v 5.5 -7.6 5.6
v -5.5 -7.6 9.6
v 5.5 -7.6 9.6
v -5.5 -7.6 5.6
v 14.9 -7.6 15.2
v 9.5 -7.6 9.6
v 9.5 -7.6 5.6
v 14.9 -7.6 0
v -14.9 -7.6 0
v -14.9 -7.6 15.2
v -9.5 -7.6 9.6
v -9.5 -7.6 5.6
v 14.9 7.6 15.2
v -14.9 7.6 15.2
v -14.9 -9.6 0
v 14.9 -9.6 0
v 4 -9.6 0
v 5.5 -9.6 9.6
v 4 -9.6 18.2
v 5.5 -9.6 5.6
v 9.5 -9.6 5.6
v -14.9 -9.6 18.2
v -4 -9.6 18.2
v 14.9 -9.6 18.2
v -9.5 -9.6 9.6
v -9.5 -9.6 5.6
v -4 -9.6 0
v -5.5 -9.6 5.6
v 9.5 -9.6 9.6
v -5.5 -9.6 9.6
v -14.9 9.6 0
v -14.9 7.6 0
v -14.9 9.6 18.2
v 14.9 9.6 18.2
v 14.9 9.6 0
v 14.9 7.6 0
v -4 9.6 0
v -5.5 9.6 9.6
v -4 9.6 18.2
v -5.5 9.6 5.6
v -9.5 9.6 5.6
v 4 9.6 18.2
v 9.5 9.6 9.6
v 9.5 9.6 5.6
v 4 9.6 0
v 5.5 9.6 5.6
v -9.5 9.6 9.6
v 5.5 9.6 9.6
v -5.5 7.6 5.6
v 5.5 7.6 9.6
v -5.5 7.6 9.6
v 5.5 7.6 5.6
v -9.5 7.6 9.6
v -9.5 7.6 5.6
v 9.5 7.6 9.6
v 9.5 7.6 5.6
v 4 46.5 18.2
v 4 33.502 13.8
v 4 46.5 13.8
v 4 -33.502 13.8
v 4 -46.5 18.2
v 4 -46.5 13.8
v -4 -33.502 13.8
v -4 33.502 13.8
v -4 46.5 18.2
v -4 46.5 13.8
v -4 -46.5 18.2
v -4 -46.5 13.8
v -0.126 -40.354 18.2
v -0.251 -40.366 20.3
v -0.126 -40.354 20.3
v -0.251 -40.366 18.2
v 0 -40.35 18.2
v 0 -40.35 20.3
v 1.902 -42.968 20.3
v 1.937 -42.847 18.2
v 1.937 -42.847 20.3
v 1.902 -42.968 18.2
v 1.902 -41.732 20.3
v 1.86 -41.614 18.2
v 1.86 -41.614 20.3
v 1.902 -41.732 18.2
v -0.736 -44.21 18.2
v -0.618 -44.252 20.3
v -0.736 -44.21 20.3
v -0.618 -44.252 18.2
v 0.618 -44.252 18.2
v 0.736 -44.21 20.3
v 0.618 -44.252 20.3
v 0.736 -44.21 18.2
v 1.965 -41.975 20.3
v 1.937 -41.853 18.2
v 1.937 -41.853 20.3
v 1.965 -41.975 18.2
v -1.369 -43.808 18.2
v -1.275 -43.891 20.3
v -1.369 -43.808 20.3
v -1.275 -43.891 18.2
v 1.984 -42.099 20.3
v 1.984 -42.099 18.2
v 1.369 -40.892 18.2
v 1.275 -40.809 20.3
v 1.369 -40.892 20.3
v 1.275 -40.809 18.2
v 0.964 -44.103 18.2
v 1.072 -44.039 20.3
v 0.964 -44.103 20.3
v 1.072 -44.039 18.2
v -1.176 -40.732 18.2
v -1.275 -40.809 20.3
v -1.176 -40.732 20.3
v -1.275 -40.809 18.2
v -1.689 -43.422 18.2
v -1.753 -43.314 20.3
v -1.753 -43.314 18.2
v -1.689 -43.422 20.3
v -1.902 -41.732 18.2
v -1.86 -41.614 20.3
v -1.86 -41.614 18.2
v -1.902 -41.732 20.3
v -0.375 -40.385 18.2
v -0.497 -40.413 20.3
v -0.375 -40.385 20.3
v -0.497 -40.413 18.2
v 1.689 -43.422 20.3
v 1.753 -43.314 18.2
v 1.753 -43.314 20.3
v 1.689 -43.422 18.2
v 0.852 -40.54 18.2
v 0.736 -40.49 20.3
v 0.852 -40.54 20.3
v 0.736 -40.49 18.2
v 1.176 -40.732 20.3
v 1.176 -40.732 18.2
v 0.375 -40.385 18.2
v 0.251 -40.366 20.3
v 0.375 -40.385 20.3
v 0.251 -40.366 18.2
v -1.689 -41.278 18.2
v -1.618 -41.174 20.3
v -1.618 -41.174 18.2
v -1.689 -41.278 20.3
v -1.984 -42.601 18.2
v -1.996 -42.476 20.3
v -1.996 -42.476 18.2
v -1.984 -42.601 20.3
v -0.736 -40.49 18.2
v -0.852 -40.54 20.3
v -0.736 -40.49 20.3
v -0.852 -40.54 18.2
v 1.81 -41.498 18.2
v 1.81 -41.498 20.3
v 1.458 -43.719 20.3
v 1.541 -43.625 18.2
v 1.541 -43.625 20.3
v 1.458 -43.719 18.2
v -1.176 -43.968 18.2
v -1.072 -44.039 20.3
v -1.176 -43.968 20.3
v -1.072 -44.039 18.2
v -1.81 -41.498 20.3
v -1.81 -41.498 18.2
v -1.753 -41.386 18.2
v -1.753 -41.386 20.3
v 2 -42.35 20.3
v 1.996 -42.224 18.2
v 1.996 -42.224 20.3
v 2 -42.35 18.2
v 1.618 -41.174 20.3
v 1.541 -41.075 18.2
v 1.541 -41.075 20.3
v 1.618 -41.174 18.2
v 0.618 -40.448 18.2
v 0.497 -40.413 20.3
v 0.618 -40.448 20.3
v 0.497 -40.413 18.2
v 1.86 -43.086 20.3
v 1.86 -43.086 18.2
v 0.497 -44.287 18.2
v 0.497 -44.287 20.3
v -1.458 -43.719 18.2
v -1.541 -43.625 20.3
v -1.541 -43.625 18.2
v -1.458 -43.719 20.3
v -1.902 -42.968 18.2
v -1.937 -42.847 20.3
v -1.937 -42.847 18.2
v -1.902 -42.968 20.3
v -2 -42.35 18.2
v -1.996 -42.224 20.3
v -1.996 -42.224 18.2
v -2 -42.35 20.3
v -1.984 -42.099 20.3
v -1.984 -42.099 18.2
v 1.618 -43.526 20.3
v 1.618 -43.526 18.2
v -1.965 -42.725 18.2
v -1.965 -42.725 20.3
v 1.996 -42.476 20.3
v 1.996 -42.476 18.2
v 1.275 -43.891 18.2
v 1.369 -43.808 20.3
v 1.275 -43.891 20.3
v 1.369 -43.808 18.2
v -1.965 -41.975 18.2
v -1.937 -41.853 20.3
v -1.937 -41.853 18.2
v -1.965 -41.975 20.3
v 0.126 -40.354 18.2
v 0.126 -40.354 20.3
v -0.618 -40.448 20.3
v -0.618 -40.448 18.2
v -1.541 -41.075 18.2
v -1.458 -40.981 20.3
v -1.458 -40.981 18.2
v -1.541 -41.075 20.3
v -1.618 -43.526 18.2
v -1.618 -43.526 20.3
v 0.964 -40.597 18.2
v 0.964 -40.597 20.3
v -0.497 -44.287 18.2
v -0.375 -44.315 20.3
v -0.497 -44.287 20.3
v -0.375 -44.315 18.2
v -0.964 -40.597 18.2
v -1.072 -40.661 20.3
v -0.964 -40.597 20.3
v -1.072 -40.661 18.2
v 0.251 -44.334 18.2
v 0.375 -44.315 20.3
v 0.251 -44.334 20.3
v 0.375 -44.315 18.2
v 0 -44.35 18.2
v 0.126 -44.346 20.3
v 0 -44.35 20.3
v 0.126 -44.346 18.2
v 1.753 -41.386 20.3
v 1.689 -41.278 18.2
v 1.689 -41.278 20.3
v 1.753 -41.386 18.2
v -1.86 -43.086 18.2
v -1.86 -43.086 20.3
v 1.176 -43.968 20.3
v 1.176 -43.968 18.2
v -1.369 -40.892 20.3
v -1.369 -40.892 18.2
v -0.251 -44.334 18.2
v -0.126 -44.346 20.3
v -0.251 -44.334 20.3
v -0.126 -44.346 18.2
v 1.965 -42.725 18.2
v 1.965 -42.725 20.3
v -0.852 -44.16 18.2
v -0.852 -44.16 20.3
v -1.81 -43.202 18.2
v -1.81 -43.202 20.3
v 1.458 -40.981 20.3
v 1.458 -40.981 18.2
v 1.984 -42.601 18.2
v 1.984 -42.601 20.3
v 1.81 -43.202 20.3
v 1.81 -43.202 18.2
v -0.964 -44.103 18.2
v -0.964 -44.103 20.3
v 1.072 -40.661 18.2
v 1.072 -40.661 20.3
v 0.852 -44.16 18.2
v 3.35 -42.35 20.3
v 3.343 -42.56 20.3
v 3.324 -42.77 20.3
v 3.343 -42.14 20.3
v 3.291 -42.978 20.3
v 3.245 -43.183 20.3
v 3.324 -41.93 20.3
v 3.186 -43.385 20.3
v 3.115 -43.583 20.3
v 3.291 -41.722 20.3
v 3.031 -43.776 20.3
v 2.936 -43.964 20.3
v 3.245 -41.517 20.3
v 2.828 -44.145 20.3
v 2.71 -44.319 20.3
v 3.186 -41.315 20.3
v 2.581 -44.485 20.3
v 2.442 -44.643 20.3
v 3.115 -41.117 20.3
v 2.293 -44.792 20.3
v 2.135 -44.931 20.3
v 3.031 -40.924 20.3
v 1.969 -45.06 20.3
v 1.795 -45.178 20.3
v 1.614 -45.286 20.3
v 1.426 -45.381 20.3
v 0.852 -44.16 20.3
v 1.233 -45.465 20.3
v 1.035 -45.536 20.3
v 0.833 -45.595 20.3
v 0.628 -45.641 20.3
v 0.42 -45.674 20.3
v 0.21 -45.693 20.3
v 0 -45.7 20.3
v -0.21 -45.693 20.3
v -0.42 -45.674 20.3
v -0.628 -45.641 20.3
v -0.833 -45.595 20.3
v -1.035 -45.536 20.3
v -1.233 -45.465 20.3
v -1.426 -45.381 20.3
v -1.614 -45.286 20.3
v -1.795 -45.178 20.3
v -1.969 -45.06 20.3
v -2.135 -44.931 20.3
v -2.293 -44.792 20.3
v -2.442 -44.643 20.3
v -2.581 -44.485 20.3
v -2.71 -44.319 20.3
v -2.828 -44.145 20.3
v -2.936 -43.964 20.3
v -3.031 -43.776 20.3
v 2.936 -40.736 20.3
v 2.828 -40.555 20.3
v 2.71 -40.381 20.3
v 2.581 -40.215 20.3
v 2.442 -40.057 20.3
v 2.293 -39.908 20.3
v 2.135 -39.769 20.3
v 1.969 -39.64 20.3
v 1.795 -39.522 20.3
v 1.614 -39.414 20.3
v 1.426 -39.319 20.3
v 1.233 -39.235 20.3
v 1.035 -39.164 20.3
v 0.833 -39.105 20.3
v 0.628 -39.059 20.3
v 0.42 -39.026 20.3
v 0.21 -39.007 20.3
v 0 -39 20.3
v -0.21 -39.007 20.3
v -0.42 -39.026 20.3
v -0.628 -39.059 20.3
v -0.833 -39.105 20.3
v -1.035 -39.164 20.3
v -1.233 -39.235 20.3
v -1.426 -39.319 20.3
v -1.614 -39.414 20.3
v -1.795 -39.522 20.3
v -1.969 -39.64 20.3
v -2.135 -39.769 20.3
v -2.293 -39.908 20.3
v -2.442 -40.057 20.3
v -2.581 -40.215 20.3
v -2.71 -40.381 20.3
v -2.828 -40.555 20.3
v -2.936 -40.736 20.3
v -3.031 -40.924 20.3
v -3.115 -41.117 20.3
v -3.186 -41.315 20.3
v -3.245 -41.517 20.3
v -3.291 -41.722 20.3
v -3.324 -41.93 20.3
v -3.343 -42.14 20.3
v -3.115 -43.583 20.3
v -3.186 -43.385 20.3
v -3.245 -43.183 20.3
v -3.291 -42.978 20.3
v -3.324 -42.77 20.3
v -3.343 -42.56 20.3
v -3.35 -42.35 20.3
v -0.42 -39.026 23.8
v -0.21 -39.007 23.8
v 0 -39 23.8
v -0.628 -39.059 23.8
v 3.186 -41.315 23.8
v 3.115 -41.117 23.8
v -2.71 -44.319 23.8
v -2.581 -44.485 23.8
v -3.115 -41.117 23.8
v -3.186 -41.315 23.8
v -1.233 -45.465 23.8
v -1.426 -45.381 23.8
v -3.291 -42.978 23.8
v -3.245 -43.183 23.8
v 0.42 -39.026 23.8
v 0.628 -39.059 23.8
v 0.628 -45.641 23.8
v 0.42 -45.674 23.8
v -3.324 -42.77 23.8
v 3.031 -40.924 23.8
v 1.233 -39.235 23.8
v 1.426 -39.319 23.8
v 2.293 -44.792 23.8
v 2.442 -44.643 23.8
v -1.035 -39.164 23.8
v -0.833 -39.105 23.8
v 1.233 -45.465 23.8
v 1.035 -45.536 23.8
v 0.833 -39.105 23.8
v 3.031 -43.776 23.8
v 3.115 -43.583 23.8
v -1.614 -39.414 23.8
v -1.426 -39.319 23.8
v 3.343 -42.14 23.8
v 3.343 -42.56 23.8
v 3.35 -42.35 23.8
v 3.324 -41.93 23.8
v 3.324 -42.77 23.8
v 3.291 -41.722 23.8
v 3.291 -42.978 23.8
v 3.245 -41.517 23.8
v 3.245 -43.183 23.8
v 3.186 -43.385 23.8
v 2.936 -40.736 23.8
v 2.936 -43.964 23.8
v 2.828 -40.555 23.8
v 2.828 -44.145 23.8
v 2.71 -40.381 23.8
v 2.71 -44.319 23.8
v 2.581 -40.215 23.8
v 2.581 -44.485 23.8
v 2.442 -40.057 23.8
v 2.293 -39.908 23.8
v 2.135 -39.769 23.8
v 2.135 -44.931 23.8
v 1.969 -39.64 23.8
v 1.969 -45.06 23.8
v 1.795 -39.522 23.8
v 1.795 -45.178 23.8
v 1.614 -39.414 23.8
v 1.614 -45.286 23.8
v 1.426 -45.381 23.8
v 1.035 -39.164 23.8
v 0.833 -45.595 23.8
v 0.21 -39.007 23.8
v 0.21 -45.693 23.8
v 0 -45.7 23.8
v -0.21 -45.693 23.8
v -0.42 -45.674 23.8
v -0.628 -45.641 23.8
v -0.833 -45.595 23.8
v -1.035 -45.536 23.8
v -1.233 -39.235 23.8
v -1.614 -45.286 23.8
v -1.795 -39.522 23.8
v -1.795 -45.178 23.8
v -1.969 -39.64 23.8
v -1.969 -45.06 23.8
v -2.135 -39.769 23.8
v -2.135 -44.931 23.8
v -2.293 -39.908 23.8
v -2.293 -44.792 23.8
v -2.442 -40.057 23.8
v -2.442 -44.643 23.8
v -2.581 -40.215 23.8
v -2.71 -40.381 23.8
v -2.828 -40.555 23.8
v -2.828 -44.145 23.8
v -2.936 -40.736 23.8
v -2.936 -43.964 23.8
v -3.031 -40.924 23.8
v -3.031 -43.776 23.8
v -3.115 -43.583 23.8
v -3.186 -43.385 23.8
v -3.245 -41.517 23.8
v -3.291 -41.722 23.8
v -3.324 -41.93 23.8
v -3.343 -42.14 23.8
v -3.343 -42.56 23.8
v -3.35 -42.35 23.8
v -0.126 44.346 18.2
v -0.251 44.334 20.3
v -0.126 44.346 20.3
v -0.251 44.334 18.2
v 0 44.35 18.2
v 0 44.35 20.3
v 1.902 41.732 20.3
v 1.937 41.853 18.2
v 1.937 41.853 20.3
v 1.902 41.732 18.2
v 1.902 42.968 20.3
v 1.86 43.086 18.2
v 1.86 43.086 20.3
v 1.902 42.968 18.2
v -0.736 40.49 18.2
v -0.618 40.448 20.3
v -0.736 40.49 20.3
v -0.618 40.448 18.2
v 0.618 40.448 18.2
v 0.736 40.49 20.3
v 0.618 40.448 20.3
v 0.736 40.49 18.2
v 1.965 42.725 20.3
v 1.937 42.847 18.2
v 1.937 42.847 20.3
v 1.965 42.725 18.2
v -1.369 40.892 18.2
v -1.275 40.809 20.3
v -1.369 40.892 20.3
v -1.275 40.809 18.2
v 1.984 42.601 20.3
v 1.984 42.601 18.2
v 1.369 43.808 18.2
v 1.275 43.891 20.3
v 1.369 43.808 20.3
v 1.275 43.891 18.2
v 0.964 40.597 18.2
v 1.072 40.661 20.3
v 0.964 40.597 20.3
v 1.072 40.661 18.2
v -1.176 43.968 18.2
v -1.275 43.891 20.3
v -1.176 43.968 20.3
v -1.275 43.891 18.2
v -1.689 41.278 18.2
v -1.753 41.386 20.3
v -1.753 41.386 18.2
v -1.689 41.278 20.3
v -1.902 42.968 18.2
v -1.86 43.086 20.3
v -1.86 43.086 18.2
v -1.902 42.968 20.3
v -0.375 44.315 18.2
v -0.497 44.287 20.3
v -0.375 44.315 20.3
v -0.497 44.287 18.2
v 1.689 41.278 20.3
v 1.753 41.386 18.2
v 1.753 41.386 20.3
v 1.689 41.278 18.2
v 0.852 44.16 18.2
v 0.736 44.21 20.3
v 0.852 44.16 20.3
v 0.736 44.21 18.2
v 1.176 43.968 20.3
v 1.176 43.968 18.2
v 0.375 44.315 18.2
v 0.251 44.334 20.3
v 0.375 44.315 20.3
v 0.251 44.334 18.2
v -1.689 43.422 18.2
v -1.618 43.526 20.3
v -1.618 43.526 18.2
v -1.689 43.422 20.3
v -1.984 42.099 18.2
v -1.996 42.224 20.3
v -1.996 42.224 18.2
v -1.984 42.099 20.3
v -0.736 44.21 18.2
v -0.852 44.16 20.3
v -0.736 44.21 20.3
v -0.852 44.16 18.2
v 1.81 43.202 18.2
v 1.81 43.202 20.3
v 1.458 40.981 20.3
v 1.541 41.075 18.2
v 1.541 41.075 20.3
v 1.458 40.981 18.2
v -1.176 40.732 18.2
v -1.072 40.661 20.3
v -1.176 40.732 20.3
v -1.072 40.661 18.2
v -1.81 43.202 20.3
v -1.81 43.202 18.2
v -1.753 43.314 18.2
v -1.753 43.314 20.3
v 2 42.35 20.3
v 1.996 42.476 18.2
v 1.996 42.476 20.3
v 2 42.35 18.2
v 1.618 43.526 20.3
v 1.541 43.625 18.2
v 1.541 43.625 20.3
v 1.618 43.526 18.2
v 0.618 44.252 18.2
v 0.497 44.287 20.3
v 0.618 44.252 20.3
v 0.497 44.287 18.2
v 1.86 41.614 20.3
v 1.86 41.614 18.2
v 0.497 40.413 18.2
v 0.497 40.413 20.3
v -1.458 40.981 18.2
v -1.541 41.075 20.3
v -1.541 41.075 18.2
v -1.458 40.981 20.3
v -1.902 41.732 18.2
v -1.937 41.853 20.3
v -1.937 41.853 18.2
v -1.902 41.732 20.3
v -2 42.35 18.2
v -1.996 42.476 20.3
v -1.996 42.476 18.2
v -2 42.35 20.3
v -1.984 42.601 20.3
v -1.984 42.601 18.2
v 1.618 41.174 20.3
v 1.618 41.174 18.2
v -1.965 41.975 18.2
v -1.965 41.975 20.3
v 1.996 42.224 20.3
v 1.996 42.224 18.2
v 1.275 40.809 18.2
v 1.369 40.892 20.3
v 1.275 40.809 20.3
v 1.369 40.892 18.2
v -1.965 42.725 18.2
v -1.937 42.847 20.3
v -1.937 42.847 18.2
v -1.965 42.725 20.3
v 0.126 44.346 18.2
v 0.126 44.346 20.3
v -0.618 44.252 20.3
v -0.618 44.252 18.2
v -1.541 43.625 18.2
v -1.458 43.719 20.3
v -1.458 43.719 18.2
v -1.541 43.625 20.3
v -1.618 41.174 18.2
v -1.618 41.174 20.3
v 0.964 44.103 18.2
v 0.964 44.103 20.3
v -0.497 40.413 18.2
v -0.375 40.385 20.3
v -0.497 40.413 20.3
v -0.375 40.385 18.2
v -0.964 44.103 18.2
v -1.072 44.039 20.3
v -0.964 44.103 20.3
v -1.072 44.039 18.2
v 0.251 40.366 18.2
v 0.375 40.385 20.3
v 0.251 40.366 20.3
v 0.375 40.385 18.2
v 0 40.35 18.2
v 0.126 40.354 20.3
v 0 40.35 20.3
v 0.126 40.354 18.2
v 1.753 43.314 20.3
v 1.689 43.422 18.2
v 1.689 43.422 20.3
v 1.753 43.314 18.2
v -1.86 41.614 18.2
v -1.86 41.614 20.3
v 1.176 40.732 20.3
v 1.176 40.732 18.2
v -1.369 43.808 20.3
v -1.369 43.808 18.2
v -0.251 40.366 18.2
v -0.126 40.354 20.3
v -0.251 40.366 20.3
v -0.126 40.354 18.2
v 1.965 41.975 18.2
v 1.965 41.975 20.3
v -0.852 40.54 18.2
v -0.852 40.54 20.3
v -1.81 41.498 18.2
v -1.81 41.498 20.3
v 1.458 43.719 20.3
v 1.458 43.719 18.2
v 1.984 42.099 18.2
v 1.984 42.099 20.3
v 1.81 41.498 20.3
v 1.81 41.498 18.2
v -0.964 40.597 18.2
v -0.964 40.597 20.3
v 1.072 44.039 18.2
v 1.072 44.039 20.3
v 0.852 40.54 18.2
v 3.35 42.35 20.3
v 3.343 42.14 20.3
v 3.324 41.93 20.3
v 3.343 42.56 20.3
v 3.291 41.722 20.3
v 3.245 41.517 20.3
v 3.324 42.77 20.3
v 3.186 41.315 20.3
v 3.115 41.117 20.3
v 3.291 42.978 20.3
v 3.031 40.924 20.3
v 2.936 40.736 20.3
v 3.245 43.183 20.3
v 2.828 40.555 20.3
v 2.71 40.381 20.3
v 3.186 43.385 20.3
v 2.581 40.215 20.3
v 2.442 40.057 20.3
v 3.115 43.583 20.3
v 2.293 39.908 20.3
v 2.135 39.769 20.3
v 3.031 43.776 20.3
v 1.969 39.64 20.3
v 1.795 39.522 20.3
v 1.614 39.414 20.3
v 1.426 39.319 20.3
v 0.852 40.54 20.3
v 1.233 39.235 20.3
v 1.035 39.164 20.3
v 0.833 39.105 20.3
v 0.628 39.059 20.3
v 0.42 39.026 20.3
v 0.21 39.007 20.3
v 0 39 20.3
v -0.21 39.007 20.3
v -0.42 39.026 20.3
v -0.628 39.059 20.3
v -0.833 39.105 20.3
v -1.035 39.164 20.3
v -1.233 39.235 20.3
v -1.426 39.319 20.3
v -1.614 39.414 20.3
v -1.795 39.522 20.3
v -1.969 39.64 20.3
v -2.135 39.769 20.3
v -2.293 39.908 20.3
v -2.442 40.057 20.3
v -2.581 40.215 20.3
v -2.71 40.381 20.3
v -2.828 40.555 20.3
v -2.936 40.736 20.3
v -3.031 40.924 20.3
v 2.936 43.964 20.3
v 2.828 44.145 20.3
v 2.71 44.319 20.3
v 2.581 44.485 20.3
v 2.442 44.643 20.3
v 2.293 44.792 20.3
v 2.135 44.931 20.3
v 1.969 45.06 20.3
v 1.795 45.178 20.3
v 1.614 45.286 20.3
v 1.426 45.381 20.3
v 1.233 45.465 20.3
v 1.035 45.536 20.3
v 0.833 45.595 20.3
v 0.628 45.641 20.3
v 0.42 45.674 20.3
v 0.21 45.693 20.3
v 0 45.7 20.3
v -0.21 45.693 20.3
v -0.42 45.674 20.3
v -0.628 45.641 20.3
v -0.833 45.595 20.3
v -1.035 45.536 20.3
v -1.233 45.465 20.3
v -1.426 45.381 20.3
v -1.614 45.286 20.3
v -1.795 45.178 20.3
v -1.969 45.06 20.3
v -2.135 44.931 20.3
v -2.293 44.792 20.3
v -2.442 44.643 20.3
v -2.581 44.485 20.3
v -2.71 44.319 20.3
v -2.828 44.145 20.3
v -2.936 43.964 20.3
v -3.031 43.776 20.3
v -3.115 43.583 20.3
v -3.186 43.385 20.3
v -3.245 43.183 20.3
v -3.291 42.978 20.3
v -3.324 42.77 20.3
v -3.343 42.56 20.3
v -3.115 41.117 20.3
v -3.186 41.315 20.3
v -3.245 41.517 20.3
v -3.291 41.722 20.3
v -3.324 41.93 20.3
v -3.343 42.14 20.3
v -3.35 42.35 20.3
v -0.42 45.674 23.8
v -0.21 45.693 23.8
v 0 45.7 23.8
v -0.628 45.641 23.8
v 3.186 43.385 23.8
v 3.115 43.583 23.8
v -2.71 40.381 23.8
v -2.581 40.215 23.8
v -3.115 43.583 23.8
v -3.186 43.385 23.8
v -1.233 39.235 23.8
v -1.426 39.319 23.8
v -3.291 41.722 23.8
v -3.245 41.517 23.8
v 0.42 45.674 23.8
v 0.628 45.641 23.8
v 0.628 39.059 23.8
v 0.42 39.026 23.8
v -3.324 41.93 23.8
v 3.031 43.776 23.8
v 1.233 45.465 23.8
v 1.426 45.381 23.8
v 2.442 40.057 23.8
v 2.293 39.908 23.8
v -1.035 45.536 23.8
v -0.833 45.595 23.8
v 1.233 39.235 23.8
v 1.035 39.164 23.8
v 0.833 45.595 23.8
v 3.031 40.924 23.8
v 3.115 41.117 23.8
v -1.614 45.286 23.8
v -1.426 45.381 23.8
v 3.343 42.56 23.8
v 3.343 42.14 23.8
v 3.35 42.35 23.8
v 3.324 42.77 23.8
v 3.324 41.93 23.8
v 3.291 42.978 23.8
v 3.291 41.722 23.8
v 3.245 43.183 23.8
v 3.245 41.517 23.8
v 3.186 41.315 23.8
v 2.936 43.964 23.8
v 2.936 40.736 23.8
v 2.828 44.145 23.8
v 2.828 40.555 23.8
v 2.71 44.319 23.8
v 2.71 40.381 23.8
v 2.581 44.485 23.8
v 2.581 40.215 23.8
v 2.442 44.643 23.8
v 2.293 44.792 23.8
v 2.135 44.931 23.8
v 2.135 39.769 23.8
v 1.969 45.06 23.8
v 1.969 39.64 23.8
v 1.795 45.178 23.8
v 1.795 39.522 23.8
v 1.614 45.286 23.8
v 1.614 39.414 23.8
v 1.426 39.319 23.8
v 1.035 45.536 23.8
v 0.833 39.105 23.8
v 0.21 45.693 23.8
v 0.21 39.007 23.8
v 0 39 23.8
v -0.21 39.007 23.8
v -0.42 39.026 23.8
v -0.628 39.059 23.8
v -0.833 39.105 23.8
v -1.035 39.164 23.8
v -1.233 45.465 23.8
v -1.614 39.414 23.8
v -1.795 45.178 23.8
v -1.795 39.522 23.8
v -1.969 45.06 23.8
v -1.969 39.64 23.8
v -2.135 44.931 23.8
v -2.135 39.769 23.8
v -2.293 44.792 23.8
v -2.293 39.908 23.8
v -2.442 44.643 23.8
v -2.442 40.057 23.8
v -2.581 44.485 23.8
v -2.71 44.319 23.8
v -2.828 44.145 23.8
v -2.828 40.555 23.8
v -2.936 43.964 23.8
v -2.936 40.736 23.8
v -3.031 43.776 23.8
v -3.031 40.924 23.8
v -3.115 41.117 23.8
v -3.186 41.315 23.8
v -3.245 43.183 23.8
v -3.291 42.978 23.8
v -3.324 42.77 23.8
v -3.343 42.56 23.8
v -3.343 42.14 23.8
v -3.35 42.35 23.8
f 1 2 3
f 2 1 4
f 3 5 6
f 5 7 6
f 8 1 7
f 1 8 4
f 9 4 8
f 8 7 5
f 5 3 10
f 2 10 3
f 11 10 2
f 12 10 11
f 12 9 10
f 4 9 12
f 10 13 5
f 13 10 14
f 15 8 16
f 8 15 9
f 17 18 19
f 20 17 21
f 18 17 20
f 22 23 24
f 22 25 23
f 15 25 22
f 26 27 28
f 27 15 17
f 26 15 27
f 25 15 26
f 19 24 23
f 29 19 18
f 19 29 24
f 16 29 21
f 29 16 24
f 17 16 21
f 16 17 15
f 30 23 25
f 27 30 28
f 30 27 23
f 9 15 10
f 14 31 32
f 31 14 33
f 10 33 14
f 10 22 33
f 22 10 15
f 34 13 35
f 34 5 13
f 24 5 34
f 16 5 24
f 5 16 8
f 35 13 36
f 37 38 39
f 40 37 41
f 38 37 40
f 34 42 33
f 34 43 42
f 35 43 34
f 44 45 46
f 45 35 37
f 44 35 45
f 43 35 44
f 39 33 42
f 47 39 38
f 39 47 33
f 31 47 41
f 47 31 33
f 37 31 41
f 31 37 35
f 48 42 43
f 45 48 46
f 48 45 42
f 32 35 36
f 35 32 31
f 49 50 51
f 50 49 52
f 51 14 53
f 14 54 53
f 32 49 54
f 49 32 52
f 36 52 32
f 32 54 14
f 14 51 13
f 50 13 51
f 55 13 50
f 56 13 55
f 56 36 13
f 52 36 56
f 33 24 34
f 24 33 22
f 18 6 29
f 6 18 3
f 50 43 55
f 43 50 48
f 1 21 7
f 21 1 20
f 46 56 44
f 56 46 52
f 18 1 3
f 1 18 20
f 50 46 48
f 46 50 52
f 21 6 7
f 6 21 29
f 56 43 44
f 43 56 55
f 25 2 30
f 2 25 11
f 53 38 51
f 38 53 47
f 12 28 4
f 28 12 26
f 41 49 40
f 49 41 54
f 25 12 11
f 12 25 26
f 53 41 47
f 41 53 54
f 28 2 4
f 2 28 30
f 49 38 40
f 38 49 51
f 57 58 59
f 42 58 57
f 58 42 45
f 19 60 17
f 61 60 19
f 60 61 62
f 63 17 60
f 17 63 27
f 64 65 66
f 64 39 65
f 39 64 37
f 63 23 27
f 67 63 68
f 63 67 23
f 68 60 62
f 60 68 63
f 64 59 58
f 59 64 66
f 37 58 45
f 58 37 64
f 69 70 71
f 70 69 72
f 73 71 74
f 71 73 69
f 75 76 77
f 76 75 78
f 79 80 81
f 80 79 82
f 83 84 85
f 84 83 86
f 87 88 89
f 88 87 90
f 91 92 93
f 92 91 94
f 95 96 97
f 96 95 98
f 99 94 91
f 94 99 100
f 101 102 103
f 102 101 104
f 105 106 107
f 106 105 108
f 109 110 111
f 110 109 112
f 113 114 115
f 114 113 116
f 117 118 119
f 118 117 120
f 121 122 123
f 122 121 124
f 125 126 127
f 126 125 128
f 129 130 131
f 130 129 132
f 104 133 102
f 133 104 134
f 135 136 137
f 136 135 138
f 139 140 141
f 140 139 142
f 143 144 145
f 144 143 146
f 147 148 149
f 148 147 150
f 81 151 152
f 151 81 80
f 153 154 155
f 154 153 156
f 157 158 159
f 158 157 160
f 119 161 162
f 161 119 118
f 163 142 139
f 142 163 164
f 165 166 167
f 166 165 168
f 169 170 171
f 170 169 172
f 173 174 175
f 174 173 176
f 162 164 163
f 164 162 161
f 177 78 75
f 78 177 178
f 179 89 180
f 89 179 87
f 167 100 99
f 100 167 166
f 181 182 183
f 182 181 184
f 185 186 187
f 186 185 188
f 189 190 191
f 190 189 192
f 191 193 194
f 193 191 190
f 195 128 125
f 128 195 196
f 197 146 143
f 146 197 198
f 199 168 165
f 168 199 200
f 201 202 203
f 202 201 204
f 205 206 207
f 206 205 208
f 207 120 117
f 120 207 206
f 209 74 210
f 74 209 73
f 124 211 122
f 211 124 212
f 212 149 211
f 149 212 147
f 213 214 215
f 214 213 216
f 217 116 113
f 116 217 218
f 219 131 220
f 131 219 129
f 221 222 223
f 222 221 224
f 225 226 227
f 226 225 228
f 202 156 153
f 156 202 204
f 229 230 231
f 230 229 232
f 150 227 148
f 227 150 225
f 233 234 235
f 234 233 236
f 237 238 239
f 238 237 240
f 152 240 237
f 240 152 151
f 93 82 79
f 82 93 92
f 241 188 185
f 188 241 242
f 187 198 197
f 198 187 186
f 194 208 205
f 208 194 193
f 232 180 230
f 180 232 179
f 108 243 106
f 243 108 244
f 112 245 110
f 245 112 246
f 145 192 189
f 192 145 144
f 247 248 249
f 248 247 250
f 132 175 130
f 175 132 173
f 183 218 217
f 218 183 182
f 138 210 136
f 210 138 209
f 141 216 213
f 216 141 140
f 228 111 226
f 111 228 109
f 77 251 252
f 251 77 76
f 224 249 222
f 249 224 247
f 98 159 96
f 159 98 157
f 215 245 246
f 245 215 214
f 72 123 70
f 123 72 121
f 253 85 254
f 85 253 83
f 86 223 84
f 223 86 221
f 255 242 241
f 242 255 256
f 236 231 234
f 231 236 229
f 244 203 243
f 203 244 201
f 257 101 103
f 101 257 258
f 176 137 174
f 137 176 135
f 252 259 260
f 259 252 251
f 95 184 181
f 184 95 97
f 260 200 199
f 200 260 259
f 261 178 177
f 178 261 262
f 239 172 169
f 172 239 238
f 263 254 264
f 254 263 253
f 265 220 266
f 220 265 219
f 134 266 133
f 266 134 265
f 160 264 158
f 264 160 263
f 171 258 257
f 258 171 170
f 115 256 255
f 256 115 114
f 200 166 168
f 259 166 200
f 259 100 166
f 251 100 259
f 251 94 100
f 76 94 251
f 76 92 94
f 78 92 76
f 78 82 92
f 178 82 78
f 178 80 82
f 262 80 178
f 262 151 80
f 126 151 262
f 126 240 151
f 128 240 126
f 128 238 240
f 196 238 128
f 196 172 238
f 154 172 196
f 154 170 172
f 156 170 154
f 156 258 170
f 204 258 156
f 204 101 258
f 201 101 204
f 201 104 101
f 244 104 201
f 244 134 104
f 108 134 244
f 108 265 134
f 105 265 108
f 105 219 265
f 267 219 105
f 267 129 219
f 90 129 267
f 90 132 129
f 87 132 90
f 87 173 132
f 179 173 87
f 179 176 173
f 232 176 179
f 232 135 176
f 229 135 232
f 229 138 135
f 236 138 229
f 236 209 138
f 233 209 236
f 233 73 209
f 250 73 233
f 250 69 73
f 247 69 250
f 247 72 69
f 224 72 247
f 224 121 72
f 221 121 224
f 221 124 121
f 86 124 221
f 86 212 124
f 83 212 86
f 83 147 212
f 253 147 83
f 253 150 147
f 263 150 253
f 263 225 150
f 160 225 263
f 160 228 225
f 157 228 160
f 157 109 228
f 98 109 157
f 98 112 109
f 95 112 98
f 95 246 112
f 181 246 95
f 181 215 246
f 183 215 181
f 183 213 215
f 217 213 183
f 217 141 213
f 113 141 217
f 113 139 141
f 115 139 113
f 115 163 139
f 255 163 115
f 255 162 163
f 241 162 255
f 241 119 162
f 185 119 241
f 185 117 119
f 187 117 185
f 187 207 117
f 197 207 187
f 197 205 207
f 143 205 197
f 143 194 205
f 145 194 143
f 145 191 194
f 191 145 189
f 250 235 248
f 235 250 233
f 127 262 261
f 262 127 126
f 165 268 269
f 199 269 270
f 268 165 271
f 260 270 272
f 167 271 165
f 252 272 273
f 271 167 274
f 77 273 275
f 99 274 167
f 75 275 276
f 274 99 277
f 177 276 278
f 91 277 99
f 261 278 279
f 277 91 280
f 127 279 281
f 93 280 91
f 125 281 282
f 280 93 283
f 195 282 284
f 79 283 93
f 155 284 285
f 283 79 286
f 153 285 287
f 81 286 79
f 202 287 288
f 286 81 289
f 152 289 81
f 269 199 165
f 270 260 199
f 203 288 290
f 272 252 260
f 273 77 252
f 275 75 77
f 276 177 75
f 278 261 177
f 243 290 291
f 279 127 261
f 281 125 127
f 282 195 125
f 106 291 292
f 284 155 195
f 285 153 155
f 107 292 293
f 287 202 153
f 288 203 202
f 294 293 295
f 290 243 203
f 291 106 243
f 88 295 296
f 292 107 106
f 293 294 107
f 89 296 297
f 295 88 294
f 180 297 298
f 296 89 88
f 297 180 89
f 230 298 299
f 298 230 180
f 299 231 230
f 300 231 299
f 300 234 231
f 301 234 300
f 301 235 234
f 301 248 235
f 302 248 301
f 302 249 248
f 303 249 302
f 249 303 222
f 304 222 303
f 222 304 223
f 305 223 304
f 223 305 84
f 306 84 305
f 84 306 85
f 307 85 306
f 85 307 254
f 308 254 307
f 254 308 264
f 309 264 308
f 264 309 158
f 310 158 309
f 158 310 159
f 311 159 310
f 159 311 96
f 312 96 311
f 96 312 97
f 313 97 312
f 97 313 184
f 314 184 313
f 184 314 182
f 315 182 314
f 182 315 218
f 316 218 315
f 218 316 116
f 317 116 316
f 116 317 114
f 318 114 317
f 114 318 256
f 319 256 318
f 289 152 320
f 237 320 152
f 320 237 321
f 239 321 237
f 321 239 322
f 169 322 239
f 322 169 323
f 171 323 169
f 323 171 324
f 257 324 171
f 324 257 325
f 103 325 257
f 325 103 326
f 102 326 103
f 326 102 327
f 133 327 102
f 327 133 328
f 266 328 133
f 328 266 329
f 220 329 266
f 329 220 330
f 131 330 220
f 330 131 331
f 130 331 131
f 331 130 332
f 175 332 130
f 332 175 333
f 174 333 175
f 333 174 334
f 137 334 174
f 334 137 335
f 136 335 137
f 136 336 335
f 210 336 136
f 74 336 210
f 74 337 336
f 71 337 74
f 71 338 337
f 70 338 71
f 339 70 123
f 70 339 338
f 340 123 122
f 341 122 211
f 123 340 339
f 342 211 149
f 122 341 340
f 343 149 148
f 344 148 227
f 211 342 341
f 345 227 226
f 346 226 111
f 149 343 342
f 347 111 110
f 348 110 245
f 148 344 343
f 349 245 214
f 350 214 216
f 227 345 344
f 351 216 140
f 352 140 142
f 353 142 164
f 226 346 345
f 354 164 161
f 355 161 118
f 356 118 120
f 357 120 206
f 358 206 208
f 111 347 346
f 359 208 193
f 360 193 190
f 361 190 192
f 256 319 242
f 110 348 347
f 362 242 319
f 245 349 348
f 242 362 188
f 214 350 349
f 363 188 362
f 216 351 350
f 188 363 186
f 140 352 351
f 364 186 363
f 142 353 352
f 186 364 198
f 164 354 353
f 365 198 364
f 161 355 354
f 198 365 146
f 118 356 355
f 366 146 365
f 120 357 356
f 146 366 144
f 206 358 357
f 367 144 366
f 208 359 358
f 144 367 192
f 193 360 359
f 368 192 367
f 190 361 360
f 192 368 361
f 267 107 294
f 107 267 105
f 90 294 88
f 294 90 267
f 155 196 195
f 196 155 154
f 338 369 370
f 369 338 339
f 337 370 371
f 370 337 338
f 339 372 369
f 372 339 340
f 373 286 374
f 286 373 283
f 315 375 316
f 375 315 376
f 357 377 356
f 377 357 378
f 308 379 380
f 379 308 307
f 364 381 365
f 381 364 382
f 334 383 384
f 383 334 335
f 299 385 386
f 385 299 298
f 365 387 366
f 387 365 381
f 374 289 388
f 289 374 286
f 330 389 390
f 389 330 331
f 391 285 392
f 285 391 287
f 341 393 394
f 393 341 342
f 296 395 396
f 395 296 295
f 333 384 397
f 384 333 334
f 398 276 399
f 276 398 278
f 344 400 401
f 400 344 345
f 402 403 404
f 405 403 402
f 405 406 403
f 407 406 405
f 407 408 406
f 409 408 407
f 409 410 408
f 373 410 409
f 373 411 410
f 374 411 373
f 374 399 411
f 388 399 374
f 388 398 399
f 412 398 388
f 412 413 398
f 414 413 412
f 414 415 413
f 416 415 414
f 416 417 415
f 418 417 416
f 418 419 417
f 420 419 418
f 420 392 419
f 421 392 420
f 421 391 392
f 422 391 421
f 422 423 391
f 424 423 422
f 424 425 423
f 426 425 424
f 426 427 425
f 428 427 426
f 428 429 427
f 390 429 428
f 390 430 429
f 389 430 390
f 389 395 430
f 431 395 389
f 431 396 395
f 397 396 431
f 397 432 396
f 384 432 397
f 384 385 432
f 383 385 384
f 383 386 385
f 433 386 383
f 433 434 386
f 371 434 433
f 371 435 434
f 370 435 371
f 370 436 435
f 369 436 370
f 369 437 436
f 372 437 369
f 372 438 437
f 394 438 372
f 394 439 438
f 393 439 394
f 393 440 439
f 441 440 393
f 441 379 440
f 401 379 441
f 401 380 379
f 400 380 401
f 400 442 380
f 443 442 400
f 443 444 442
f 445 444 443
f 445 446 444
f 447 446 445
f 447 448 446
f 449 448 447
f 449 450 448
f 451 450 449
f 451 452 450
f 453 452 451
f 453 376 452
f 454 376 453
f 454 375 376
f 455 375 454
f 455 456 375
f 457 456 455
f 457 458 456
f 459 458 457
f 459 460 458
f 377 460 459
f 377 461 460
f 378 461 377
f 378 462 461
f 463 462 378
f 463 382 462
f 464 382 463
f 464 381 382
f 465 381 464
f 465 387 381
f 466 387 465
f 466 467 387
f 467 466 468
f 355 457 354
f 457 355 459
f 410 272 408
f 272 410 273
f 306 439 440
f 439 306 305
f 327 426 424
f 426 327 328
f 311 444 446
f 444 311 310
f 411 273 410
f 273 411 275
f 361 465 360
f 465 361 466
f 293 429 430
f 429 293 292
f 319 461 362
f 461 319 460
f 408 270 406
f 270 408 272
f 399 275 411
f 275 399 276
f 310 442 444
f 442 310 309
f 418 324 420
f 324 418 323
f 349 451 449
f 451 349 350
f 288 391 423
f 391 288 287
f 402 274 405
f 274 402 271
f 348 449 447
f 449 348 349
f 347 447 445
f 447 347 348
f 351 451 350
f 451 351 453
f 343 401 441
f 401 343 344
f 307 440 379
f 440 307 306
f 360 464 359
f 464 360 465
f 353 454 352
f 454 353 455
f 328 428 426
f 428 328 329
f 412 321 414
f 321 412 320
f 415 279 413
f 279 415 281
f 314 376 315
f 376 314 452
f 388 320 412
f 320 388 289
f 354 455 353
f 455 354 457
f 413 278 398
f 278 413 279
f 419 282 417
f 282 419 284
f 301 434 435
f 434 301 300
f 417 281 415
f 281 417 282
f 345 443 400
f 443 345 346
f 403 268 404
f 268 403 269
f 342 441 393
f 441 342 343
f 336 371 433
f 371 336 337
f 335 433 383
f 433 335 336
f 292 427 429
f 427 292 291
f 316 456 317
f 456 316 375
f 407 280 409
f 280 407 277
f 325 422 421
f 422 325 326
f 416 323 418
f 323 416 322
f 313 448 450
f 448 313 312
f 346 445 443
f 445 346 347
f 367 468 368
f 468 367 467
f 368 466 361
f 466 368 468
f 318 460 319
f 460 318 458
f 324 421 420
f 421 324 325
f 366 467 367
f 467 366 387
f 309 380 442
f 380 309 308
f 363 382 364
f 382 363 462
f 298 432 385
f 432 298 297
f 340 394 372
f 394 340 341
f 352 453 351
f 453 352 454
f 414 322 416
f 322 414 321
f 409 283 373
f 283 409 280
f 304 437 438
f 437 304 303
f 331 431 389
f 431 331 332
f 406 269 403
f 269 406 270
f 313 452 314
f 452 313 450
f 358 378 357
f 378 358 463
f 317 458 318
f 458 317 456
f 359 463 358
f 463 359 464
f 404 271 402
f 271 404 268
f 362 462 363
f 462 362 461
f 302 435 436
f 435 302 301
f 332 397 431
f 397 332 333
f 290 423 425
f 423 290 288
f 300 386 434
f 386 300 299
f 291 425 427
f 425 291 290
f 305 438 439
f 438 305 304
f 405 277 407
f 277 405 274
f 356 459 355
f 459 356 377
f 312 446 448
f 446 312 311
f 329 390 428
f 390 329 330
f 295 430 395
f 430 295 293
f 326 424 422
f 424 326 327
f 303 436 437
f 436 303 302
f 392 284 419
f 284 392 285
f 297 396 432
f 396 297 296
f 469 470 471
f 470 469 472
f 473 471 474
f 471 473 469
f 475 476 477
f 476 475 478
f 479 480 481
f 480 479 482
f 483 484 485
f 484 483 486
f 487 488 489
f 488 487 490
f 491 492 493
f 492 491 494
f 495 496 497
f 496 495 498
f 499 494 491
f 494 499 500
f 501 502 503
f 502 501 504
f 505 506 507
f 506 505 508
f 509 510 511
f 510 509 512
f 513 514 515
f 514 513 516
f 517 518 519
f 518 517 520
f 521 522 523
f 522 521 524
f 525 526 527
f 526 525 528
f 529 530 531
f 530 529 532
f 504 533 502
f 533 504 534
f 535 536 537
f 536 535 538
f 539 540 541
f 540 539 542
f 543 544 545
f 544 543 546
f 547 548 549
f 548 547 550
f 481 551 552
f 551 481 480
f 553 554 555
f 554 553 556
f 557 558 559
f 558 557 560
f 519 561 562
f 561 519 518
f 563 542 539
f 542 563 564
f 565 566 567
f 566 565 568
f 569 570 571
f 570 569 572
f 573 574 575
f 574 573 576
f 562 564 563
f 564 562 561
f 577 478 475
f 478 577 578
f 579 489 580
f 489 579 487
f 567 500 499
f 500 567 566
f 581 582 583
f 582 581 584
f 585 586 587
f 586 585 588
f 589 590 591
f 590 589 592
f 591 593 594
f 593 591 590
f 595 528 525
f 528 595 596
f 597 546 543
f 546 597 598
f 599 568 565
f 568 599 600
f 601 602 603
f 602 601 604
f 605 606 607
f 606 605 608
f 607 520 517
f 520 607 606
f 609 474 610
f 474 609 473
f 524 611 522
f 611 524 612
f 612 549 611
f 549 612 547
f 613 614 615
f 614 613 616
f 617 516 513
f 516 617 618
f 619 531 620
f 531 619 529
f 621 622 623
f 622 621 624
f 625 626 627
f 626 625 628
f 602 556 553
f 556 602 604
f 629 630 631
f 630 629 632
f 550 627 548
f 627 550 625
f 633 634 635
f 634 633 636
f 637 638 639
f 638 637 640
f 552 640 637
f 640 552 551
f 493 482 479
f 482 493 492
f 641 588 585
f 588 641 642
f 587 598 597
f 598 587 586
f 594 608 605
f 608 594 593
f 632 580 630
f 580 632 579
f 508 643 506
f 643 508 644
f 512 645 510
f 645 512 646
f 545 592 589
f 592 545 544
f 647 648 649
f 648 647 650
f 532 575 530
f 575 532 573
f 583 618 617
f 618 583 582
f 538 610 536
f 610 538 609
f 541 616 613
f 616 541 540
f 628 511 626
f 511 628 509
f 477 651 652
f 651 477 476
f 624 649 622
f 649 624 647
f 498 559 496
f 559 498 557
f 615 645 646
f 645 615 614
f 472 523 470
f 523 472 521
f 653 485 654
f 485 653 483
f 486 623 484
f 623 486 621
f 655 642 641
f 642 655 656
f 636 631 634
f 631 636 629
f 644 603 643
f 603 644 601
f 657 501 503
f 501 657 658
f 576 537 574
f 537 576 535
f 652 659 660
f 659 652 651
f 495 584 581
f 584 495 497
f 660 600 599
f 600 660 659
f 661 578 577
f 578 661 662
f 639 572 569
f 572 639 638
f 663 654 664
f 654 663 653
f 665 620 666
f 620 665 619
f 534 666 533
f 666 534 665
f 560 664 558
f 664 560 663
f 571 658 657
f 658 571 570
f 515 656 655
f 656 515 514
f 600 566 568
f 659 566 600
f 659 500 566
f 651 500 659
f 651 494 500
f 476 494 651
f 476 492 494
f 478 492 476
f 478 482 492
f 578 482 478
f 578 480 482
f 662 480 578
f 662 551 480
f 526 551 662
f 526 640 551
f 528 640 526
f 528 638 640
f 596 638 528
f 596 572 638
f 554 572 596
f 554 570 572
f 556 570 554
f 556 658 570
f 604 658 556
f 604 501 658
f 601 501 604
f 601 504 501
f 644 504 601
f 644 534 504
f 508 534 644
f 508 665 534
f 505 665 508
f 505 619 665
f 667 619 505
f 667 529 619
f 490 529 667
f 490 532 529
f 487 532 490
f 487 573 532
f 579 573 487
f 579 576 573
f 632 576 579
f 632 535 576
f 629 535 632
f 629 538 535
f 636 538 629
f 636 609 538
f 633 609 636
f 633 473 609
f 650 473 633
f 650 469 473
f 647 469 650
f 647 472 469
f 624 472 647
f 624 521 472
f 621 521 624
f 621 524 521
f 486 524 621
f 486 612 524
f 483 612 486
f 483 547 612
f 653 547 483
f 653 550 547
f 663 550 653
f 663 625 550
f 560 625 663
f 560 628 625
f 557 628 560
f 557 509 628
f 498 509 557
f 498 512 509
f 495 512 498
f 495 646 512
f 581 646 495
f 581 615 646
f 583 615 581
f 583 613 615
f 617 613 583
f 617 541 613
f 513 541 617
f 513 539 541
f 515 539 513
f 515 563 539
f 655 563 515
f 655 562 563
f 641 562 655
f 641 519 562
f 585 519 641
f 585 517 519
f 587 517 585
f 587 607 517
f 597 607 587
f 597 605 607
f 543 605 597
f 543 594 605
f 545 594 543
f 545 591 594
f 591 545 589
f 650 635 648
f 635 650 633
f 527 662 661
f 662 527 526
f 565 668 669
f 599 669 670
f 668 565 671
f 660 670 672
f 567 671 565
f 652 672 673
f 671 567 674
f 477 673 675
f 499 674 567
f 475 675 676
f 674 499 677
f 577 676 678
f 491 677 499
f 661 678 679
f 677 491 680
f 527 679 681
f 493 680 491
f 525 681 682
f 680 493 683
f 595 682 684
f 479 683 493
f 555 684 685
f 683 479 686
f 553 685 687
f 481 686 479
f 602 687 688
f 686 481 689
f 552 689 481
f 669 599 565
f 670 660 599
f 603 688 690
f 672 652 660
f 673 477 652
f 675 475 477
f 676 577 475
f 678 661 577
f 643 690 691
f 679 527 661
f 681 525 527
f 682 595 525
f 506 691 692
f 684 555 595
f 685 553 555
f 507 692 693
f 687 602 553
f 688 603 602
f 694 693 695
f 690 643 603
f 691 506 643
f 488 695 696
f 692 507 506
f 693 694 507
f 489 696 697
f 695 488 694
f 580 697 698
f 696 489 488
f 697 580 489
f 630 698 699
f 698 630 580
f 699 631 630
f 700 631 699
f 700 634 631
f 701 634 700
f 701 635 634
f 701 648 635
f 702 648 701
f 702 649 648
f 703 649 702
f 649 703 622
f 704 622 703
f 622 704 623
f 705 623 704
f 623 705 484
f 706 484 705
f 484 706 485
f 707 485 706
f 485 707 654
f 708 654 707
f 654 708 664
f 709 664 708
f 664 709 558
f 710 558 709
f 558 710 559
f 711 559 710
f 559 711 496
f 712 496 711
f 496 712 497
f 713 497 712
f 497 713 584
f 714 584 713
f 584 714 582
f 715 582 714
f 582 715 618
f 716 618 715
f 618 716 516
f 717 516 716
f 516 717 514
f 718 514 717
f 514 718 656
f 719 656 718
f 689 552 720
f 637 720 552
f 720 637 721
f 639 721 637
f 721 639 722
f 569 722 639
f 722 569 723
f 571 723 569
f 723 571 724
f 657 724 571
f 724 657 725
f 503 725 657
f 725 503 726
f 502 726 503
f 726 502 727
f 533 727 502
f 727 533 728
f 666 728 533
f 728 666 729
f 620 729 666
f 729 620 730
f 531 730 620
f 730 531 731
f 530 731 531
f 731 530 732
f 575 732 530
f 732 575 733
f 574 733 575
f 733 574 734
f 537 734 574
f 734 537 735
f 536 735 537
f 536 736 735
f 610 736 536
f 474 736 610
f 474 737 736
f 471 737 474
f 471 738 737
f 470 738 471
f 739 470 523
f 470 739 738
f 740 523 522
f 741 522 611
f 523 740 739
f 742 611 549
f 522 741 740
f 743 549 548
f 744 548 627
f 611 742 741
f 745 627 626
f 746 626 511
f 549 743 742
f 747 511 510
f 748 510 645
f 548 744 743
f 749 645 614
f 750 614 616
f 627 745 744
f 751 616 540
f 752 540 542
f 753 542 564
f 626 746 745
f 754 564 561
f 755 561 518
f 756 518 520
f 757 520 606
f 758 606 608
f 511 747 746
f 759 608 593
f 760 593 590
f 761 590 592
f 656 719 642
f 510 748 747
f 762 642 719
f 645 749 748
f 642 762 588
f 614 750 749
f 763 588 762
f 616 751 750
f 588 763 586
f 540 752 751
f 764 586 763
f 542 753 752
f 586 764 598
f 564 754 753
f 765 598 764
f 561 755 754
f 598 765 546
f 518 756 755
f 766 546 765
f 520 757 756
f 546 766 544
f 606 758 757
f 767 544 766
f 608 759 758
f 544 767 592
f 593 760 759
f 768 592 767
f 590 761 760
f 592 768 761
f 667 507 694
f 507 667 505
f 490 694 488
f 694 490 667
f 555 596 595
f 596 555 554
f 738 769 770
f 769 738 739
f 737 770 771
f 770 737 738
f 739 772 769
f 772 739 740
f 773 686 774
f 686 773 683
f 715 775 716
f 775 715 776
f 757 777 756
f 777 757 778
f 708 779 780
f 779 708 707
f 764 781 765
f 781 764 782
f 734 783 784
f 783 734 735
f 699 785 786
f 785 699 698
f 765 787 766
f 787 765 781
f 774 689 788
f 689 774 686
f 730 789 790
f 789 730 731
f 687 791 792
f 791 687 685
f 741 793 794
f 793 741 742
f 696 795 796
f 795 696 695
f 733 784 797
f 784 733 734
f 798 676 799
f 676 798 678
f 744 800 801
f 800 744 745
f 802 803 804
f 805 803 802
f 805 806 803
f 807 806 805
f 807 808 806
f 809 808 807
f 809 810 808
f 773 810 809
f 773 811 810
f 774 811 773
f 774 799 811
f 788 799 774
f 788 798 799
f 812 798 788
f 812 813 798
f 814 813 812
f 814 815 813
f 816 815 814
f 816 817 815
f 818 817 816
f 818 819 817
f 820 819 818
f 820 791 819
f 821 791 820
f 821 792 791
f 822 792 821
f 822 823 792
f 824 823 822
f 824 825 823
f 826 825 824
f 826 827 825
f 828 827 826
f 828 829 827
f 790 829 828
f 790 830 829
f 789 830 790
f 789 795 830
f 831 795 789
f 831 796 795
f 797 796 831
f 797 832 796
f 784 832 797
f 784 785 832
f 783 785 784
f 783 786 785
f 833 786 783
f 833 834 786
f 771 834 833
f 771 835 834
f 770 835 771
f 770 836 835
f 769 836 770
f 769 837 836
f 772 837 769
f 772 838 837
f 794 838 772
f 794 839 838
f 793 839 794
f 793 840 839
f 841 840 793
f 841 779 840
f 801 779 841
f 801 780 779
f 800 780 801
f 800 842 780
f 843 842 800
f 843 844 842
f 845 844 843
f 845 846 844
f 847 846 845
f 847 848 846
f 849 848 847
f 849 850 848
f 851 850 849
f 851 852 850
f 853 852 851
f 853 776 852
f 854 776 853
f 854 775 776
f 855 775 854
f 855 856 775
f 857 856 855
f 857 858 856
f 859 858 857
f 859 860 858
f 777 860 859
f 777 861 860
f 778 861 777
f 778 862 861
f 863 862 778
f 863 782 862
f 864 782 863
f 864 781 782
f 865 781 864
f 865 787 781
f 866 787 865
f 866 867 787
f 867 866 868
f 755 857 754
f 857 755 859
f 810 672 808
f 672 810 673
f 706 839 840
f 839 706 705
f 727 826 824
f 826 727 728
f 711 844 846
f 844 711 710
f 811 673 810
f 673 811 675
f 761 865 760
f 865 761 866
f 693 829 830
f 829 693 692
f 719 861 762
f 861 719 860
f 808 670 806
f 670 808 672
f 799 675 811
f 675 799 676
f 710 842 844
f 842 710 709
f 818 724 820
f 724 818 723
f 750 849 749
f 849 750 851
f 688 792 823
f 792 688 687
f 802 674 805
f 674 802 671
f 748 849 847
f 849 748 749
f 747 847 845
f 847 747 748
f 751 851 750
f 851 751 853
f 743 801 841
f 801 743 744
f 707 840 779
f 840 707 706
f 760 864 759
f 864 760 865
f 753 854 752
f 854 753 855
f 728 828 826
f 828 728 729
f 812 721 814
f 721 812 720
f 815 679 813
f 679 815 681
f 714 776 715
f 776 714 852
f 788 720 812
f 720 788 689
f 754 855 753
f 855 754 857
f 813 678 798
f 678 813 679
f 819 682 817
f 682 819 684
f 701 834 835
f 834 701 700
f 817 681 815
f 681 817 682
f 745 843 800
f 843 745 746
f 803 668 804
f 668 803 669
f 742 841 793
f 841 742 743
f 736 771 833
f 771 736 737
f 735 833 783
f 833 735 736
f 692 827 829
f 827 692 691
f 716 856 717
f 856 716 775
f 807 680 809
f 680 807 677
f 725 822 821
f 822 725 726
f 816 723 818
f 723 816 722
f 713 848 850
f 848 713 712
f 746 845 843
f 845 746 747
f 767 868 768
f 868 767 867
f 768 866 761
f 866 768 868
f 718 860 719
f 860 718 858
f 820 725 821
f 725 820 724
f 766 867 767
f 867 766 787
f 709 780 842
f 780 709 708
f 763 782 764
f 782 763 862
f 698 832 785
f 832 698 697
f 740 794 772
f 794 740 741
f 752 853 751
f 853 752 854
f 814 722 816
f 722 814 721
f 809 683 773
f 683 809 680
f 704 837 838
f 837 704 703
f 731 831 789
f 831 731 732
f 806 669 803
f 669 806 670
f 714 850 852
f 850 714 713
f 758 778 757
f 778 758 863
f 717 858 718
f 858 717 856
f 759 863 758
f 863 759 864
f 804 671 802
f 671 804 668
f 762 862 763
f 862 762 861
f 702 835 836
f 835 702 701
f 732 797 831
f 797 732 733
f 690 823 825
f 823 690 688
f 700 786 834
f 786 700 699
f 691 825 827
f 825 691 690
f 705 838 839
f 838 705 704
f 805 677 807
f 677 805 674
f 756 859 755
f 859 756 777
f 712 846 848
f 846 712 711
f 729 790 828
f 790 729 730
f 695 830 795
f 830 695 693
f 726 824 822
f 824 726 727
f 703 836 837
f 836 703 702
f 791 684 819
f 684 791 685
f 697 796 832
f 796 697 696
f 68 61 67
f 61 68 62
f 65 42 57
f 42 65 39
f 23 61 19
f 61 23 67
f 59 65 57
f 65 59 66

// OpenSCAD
// Ruckus AP HomeRacker sleeve scaffold
//
// CC BY-SA 4.0

/* [HomeRacker Sleeve] */
part_mode = 3; // [0:Sleeve only,1:Reference STL only,2:Sleeve with reference overlay,3:Prototype mount,4:Prototype with reference overlay]
sleeve_units = 9; // [3:1:12]
sleeve_island_count = 1; // [1:One centered island,2:Two end islands]
sleeve_holes_per_island = 2; // [1:1:8]
sleeve_rotation = 90; // [0,90]
sleeve_wall = 2; // [1.2:0.1:4]
sleeve_roof_thickness = 3; // [1.6:0.1:6]
sleeve_tolerance = 0.2; // [0:0.05:0.6]
lockpin_holes_enabled = true; // [false,true]

/* [Reference] */
reference_alpha = 0.25; // [0:0.05:1]
reference_scale = 1; // [0.1:0.01:5]
reference_translate = [0, 0, 0];
reference_rotate = [0, 0, 0];

/* [Ruckus Interface] */
ruckus_base_length = 93; // [60:0.1:130]
ruckus_base_width = 24; // [12:0.1:50]
ruckus_base_thickness = 4.4; // [1:0.1:8]
ruckus_bridge_width = 8; // [4:0.1:20]
ruckus_raised_bridge_length = 32.25; // [10:0.1:80]
ruckus_raised_bridge_width = 6; // [3:0.1:20]
ruckus_raised_bridge_height = 0; // [0:0.1:6]
ruckus_prong_spacing = 84.7; // [50:0.1:110]
ruckus_prong_shaft_diameter = 4; // [2:0.1:8]
ruckus_prong_shaft_height = 2.1; // [1:0.1:8]
ruckus_prong_cap_diameter = 6.7; // [3:0.1:12]
ruckus_prong_cap_height = 3.5; // [1:0.1:8]
ruckus_interface_rotation = 90; // [0,90]
ruckus_mount_z = -4.4; // [-20:0.1:30]
ruckus_gussets_enabled = true; // [false,true]
ruckus_gusset_thickness = 8; // [1:0.1:20]
ruckus_gusset_overhang_angle = 30; // [10:0.1:60]

/* [Debug] */
debug_colors = false; // [false,true]

/* [Hidden] */
$fn = 100;
EPSILON = 0.01;

// HomeRacker-compatible dimensions, mirrored locally so the model also
// compiles when opened directly in the OpenSCAD GUI.
BASE_UNIT = 15;
BASE_STRENGTH = 2;
TOLERANCE = 0.2;
LOCKPIN_HOLE_SIDE_LENGTH = 4;
HR_YELLOW = "#f7b600";
REFERENCE_BLUE = "#4c78a8";
PRONG_GREEN = "#00a651";

LOCKPIN_SIDE = LOCKPIN_HOLE_SIDE_LENGTH;
SLEEVE_INNER_SIDE = BASE_UNIT + sleeve_tolerance;
SLEEVE_OUTER_WIDTH = BASE_UNIT + 2 * sleeve_wall + sleeve_tolerance;
SLEEVE_SEGMENT_LENGTH = sleeve_holes_per_island * BASE_UNIT - sleeve_tolerance;
SLEEVE_ROOF_SEGMENT_LENGTH = SLEEVE_SEGMENT_LENGTH;
SLEEVE_ROOF_WIDTH = SLEEVE_OUTER_WIDTH;
SLEEVE_SEGMENT_OFFSET = sleeve_island_count == 1 ? 0 : (sleeve_units - sleeve_holes_per_island) * BASE_UNIT / 2;
SLEEVE_LOCKPIN_CENTER_Z = BASE_UNIT / 2 + sleeve_tolerance / 2;
SLEEVE_ISLAND_SIDES = sleeve_island_count == 1 ? [0] : [-1, 1];
RUCKUS_INTERFACE_BASE_Z = SLEEVE_INNER_SIDE + sleeve_roof_thickness + ruckus_mount_z;
RUCKUS_GUSSET_INNER_X = SLEEVE_OUTER_WIDTH / 2;
RUCKUS_GUSSET_OUTER_X = min(
    ruckus_base_length / 2,
    RUCKUS_GUSSET_INNER_X + RUCKUS_INTERFACE_BASE_Z / tan(ruckus_gusset_overhang_angle)
);
REFERENCE_CENTER = [62.5, 40, 0];

module centered_box(size) {
    cube(size, center = true);
}

module lockpin_hole() {
    centered_box([SLEEVE_OUTER_WIDTH + EPSILON, LOCKPIN_SIDE, LOCKPIN_SIDE]);
}

module lockpin_holes() {
    if (lockpin_holes_enabled) {
        for (segment_side = SLEEVE_ISLAND_SIDES) {
            for (hole = [0 : 1 : sleeve_holes_per_island - 1]) {
                local_y = (hole - (sleeve_holes_per_island - 1) / 2) * BASE_UNIT;

                translate([0, segment_side * SLEEVE_SEGMENT_OFFSET + local_y, SLEEVE_LOCKPIN_CENTER_Z])
                    lockpin_hole();
            }
        }
    }
}

module sleeve_segment(segment_side) {
    segment_y = segment_side * SLEEVE_SEGMENT_OFFSET;

    union() {
        for (wall_side = [-1, 1]) {
            translate([
                wall_side * (SLEEVE_INNER_SIDE / 2 + sleeve_wall / 2),
                segment_y,
                SLEEVE_INNER_SIDE / 2
            ])
                centered_box([sleeve_wall, SLEEVE_SEGMENT_LENGTH, SLEEVE_INNER_SIDE]);
        }

        translate([0, segment_y, SLEEVE_INNER_SIDE + sleeve_roof_thickness / 2])
            centered_box([SLEEVE_ROOF_WIDTH, SLEEVE_ROOF_SEGMENT_LENGTH, sleeve_roof_thickness]);
    }
}

module homeracker_sleeve() {
    color(debug_colors ? HR_YELLOW : HR_YELLOW)
    rotate([0, 0, sleeve_rotation])
    difference() {
        union() {
            for (segment_side = SLEEVE_ISLAND_SIDES)
                sleeve_segment(segment_side);
        }

        lockpin_holes();
    }
}

module homeracker_channel_clearance() {
    rotate([0, 0, sleeve_rotation])
    for (segment_side = SLEEVE_ISLAND_SIDES) {
        segment_y = segment_side * SLEEVE_SEGMENT_OFFSET;

        translate([0, segment_y, SLEEVE_INNER_SIDE / 2])
            centered_box([
                SLEEVE_INNER_SIDE + 2 * EPSILON,
                SLEEVE_SEGMENT_LENGTH + 2 * EPSILON,
                SLEEVE_INNER_SIDE + 2 * EPSILON
            ]);
    }
}

module reference_mount() {
    color(REFERENCE_BLUE, reference_alpha)
    translate(reference_translate)
    rotate(reference_rotate)
    scale(reference_scale)
    translate(-REFERENCE_CENTER)
        import("../../../reference/Ruckus_Wall_Mount_-_Miniature_Experimental.stl", convexity = 10);
}

module ruckus_prong(center_x) {
    color(PRONG_GREEN)
    translate([center_x, 0, ruckus_base_thickness])
    union() {
        cylinder(d = ruckus_prong_shaft_diameter, h = ruckus_prong_shaft_height);
        translate([0, 0, ruckus_prong_shaft_height])
            cylinder(d = ruckus_prong_cap_diameter, h = ruckus_prong_cap_height);
    }
}

module ruckus_base_outline_2d() {
    square([ruckus_base_length, ruckus_bridge_width], center = true);
}

module ruckus_drop_gusset_positive() {
    x_inner = RUCKUS_GUSSET_INNER_X;
    x_outer = RUCKUS_GUSSET_OUTER_X;
    y0 = -ruckus_gusset_thickness / 2;
    y1 = ruckus_gusset_thickness / 2;
    z_bottom = -RUCKUS_INTERFACE_BASE_Z;

    color(debug_colors ? REFERENCE_BLUE : "#f5f5f0")
    polyhedron(
        points = [
            [x_inner, y0, z_bottom],
            [x_inner, y0, 0],
            [x_outer, y0, 0],
            [x_inner, y1, z_bottom],
            [x_inner, y1, 0],
            [x_outer, y1, 0]
        ],
        faces = [
            [0, 1, 2],
            [3, 5, 4],
            [0, 3, 4, 1],
            [1, 4, 5, 2],
            [2, 5, 3, 0]
        ]
    );
}

module ruckus_drop_gusset(side) {
    if (side < 0) {
        mirror([1, 0, 0])
            ruckus_drop_gusset_positive();
    } else {
        ruckus_drop_gusset_positive();
    }
}

module ruckus_drop_gussets() {
    if (ruckus_gussets_enabled) {
        for (side = [-1, 1])
            ruckus_drop_gusset(side);
    }
}

module ruckus_reference_approximation() {
    union() {
        color(debug_colors ? REFERENCE_BLUE : "#f5f5f0")
            linear_extrude(ruckus_base_thickness)
                ruckus_base_outline_2d();

        ruckus_drop_gussets();

        if (ruckus_raised_bridge_height > 0) {
            color(debug_colors ? REFERENCE_BLUE : "#f5f5f0")
            translate([0, 0, ruckus_base_thickness + ruckus_raised_bridge_height / 2])
                centered_box([ruckus_raised_bridge_length, ruckus_raised_bridge_width, ruckus_raised_bridge_height]);
        }

        for (side = [-1, 1])
            ruckus_prong(side * ruckus_prong_spacing / 2);
    }
}

module prototype_mount() {
    union() {
        homeracker_sleeve();

        difference() {
            translate([0, 0, SLEEVE_INNER_SIDE + sleeve_roof_thickness + ruckus_mount_z])
                rotate([0, 0, ruckus_interface_rotation])
                    ruckus_reference_approximation();

            homeracker_channel_clearance();
        }
    }
}

module model() {
    assert(sleeve_units > 0, "Sleeve units must be positive.");
    assert(sleeve_island_count == 1 || sleeve_island_count == 2, "Sleeve island count must be 1 or 2.");
    assert(sleeve_holes_per_island > 0, "At least one sleeve hole per island is required.");
    assert(sleeve_island_count == 1 || sleeve_holes_per_island * 2 <= sleeve_units, "Sleeve end segments overlap; reduce holes per island or increase sleeve units.");
    assert(sleeve_rotation == 0 || sleeve_rotation == 90, "Sleeve rotation must be 0 or 90 degrees.");
    assert(part_mode >= 0 && part_mode <= 4, "Part mode must be 0, 1, 2, 3, or 4.");
    assert(ruckus_interface_rotation == 0 || ruckus_interface_rotation == 90, "Ruckus interface rotation must be 0 or 90 degrees.");
    assert(ruckus_prong_shaft_diameter > 0, "Ruckus prong shaft diameter must be positive.");
    assert(ruckus_prong_shaft_height > 0, "Ruckus prong shaft height must be positive.");
    assert(ruckus_prong_cap_diameter >= ruckus_prong_shaft_diameter, "Ruckus prong cap must be at least as wide as the shaft.");
    assert(ruckus_prong_cap_height > 0, "Ruckus prong cap height must be positive.");
    assert(RUCKUS_INTERFACE_BASE_Z >= 0, "Ruckus interface base must stay at or above global z=0.");
    assert(ruckus_gusset_thickness > 0, "Ruckus gusset thickness must be positive.");
    assert(ruckus_gusset_overhang_angle > 0 && ruckus_gusset_overhang_angle < 90, "Ruckus gusset overhang angle must be between 0 and 90 degrees.");
    assert(RUCKUS_GUSSET_OUTER_X > RUCKUS_GUSSET_INNER_X, "Ruckus gusset leaves no horizontal span.");

    if (part_mode == 0) {
        homeracker_sleeve();
    } else if (part_mode == 1) {
        reference_mount();
    } else if (part_mode == 2) {
        homeracker_sleeve();
        translate([0, 0, SLEEVE_INNER_SIDE + sleeve_roof_thickness])
            rotate([0, 0, ruckus_interface_rotation])
                reference_mount();
    } else if (part_mode == 3) {
        prototype_mount();
    } else if (part_mode == 4) {
        prototype_mount();
        translate([0, 0, SLEEVE_INNER_SIDE + sleeve_roof_thickness])
            rotate([0, 0, ruckus_interface_rotation])
                reference_mount();
    }
}

model();
